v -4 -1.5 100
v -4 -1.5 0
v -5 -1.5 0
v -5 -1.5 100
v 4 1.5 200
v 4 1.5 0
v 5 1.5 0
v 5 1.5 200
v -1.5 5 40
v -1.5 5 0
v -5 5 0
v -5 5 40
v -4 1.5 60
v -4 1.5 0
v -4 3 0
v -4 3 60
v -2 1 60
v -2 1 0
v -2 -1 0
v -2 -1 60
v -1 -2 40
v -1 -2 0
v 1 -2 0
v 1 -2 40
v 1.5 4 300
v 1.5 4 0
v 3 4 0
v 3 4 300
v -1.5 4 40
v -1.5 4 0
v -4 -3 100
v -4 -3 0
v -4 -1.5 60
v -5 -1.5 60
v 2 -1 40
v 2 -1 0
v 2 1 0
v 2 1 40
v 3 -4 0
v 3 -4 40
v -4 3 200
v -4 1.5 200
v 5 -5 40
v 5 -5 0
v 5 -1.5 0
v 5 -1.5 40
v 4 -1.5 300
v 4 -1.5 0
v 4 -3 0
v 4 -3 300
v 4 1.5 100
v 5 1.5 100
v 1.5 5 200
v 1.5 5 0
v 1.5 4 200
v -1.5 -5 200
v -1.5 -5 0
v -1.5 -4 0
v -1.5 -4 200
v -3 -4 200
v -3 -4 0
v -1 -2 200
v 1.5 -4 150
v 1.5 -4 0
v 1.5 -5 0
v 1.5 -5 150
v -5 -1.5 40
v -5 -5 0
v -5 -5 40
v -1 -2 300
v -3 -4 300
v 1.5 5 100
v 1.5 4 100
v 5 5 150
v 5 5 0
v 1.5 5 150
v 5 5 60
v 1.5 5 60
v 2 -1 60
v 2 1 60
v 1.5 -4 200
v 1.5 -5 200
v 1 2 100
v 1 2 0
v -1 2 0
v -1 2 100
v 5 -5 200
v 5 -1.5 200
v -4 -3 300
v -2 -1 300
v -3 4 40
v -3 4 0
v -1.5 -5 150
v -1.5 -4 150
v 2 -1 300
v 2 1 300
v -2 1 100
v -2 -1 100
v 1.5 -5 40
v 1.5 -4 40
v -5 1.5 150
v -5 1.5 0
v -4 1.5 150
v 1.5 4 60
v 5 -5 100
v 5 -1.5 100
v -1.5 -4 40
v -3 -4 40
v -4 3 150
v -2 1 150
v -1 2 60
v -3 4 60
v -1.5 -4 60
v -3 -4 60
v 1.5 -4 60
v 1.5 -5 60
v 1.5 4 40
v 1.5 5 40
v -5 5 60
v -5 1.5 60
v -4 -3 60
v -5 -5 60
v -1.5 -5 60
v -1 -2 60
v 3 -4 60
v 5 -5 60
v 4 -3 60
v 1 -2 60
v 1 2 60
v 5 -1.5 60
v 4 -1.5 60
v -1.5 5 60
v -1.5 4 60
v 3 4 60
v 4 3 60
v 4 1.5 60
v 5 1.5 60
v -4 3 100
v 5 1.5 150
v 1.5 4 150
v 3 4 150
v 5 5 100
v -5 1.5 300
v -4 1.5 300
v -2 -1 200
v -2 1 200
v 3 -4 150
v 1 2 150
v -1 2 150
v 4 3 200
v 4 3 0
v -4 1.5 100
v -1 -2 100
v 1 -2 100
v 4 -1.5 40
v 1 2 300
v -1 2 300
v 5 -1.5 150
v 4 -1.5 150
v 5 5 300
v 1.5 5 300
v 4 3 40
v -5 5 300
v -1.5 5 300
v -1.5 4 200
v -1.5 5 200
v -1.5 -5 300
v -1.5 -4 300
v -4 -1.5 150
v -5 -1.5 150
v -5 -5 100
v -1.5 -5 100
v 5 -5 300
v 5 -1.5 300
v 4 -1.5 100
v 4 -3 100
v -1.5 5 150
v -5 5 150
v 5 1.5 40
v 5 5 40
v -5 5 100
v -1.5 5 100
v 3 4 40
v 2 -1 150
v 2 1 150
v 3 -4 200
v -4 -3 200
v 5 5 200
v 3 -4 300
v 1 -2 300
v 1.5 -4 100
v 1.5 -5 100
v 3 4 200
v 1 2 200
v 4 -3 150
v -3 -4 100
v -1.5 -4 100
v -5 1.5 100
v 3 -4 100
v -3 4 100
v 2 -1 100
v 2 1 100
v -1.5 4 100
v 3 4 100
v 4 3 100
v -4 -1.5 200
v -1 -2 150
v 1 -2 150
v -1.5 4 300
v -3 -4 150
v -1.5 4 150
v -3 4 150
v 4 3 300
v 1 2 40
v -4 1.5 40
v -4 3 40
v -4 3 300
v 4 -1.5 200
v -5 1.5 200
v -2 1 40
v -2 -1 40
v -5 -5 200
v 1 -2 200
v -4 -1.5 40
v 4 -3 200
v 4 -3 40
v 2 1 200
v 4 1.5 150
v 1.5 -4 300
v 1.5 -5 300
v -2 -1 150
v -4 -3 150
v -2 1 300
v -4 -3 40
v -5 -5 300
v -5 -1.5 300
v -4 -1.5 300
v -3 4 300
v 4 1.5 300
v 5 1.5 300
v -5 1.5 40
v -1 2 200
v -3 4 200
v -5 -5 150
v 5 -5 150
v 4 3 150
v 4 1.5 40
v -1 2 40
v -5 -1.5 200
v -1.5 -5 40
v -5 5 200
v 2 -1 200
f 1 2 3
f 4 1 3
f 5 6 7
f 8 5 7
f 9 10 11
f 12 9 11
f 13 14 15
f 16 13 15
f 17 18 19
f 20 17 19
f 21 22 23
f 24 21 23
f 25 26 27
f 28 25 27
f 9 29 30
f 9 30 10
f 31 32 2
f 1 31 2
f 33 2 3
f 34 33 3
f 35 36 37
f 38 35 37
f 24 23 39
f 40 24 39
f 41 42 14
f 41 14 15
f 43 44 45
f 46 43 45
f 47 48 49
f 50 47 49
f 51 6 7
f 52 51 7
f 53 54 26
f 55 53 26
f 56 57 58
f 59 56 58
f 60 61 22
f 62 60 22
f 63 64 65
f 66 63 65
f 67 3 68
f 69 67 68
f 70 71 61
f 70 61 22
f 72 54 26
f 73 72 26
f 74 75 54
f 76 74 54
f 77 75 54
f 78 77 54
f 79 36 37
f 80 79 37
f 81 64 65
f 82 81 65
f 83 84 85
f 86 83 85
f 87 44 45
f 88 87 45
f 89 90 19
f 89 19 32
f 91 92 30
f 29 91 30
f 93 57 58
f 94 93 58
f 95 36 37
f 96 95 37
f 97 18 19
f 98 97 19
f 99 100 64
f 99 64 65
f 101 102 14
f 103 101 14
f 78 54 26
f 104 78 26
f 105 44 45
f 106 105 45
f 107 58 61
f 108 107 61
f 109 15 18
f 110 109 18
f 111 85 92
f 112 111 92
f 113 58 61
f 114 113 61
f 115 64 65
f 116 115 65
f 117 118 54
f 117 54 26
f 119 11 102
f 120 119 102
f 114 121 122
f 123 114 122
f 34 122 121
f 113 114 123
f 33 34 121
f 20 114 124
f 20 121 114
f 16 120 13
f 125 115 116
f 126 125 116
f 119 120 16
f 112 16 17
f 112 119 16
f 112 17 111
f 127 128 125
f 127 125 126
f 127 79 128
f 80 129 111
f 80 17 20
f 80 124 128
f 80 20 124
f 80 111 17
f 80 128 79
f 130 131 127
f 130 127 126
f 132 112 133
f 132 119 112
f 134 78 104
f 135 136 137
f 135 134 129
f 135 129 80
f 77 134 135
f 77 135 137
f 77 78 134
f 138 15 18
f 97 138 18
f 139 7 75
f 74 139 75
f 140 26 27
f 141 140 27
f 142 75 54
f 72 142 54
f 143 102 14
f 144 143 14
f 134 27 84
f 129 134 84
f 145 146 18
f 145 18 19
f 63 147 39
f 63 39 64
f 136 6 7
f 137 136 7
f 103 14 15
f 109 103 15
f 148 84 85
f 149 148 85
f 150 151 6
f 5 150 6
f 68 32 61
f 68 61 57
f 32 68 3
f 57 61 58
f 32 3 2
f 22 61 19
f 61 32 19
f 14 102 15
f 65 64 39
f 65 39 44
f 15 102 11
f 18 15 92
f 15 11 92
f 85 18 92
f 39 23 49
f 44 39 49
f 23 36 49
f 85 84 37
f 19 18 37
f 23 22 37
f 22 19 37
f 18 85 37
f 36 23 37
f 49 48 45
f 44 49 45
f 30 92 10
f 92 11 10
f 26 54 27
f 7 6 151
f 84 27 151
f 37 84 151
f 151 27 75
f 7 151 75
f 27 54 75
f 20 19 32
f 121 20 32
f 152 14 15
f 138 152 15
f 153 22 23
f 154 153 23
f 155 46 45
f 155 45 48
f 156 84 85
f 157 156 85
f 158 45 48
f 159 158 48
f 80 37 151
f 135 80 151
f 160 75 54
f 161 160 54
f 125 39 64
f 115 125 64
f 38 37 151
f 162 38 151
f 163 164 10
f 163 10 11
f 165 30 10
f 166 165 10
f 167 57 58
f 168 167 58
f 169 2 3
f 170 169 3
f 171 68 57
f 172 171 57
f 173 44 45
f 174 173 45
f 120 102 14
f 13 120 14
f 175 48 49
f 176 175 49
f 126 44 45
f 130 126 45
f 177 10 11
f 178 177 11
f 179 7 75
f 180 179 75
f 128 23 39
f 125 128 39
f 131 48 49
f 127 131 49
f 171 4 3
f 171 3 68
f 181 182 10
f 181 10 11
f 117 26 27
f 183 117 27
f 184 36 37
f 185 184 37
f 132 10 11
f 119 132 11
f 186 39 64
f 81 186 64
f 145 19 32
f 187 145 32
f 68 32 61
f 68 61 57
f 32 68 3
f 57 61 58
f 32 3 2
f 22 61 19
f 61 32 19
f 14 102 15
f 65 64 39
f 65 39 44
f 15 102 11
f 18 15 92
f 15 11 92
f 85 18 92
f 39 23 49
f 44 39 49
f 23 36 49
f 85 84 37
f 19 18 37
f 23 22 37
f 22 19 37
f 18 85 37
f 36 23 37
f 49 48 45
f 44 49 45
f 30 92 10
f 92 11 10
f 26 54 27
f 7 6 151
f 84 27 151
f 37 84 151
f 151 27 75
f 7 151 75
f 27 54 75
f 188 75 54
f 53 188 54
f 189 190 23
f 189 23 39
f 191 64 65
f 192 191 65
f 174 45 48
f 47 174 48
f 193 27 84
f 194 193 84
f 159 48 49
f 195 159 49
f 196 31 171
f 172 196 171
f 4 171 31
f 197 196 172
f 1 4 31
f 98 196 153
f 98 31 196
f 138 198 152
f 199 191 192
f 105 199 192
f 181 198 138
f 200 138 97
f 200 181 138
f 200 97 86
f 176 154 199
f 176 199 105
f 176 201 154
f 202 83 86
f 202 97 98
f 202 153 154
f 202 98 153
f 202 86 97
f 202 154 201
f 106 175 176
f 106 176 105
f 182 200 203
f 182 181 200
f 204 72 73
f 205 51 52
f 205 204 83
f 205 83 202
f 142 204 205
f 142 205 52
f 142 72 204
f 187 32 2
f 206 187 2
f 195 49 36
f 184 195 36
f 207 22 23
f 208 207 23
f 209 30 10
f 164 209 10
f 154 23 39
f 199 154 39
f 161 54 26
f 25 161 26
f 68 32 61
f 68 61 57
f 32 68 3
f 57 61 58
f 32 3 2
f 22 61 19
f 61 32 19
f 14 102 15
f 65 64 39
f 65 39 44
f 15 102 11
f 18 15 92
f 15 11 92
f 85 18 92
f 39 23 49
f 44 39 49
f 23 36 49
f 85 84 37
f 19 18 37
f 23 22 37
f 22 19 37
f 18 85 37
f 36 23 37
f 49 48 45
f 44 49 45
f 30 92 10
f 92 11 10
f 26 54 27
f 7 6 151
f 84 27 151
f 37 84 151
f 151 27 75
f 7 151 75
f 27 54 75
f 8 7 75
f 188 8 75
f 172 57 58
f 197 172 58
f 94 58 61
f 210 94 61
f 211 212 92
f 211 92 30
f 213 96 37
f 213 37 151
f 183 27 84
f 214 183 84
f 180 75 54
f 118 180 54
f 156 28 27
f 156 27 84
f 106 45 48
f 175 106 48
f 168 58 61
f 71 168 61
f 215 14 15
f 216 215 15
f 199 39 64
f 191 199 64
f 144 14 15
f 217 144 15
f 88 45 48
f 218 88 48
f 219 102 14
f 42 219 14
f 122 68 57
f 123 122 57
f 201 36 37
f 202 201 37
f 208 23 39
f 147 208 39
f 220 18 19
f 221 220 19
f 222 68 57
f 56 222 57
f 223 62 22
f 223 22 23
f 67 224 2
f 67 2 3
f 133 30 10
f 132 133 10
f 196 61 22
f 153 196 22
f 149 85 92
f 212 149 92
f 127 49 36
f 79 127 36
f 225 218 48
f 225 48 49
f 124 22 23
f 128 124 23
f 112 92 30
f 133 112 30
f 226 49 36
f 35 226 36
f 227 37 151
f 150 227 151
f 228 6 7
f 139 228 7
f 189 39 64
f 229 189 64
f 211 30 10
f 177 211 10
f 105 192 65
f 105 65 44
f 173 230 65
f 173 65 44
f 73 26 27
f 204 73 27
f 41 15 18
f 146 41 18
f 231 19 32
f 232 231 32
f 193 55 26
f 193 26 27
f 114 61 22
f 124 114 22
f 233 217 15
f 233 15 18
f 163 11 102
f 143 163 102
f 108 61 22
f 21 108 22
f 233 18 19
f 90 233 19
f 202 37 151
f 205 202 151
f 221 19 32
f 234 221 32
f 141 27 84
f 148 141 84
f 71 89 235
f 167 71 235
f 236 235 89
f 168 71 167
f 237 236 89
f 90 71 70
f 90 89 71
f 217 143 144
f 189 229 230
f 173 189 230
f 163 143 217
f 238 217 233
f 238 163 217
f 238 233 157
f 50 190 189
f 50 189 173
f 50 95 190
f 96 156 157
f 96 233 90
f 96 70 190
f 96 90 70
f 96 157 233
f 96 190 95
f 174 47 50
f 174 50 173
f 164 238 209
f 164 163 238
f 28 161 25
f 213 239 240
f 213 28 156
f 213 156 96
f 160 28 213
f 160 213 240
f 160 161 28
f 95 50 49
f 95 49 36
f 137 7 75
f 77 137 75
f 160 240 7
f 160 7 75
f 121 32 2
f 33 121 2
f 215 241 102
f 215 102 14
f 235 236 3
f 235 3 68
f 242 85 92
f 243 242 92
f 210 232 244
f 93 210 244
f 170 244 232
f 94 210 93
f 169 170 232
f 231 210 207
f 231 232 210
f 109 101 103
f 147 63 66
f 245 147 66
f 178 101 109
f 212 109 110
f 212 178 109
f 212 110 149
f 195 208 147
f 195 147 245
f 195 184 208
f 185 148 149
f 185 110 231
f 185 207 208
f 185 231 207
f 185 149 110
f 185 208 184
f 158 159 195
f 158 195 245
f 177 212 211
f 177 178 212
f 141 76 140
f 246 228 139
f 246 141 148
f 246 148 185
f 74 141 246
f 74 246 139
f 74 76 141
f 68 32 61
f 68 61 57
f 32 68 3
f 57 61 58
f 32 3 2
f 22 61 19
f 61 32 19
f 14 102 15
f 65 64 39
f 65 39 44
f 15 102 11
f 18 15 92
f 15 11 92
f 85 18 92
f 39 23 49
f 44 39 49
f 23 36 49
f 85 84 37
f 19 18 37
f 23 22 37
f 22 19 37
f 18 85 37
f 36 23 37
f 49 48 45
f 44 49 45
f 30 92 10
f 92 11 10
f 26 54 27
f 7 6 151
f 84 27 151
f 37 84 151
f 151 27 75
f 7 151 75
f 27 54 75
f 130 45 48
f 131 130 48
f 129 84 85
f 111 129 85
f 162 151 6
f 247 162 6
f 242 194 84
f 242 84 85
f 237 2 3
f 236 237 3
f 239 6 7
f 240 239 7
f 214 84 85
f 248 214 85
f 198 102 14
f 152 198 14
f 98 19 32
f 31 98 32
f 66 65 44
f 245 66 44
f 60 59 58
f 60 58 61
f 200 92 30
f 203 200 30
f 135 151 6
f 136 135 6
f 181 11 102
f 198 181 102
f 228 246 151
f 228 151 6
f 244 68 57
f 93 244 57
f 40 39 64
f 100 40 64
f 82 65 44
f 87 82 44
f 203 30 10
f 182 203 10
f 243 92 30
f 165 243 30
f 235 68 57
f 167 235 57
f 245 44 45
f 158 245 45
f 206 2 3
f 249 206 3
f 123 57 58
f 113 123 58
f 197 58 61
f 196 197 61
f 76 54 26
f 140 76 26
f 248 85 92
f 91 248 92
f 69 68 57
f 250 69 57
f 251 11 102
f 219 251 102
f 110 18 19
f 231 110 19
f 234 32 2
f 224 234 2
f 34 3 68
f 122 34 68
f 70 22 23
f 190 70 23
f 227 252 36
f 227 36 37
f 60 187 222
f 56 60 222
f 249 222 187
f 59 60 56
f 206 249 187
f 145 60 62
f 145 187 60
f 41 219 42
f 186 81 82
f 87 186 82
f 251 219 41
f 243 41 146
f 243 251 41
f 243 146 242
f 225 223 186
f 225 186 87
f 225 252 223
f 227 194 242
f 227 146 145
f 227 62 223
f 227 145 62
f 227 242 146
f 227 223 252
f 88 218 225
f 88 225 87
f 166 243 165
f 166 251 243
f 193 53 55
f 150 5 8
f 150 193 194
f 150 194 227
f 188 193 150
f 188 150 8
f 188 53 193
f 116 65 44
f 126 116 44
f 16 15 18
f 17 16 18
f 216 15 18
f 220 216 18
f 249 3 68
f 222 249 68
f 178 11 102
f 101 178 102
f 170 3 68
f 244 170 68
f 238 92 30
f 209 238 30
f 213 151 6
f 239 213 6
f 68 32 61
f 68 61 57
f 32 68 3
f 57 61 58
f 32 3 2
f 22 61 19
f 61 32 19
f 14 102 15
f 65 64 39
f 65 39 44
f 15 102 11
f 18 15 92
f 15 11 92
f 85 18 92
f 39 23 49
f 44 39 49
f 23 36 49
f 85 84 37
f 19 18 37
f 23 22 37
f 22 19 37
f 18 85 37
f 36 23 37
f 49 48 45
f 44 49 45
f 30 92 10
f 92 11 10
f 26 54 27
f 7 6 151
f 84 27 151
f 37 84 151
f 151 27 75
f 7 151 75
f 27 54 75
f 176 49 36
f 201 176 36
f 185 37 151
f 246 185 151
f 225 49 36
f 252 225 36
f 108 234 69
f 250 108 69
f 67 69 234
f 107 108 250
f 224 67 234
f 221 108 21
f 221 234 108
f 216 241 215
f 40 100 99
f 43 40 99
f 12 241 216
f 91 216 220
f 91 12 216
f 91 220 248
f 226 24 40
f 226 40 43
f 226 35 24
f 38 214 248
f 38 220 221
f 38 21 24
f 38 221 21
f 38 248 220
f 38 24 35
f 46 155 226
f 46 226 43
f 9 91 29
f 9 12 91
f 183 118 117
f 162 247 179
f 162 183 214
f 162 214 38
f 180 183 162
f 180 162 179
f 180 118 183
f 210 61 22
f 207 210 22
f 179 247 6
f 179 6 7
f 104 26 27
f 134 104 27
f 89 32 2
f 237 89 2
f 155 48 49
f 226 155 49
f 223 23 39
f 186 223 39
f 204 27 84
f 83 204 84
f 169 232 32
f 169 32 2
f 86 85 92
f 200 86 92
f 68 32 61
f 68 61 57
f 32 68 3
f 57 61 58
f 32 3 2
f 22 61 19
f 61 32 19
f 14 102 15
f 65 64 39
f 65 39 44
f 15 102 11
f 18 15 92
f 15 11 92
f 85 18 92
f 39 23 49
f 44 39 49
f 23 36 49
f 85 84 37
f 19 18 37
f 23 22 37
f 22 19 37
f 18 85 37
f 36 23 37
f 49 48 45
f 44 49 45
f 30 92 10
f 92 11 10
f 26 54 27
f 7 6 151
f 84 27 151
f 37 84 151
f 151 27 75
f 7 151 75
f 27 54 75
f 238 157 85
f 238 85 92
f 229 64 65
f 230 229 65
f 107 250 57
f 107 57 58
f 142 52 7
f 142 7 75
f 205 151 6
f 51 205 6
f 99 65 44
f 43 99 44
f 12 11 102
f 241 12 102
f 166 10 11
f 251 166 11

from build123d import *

# Parameters (mm, degrees)
F1_DEPTH = 200
F2_DEPTH = 150
F3_DEPTH = 100
F4_DEPTH = 300
F5_DEPTH = 60
F6_DEPTH = 40


with BuildPart() as f1:
    # F0 (on Top) → F1 (new body)
    with BuildSketch(Plane.XY):
        Polygon((3, -4), (1.5, -4), (1.5, -5), (5, -5), (5, -1.5), (4, -1.5), (4, -3), (2, -1), (2, 0), (2, 1), (4, 3), (4, 1.5), (5, 1.5), (5, 5), (1.5, 5), (1.5, 4), (3, 4), (1, 2), (0, 2), (-1, 2), (-3, 4), (-1.5, 4), (-1.5, 5), (-5, 5), (-5, 1.5), (-4, 1.5), (-4, 3), (-2, 1), (-2, 0), (-2, -1), (-4, -3), (-4, -1.5), (-5, -1.5), (-5, -5), (-1.5, -5), (-1.5, -4), (-3, -4), (-1, -2), (0, -2), (1, -2), align=None)
    extrude(amount=F1_DEPTH)


with BuildPart() as f2:
    # F0 (on Top) → F2 (new body)
    with BuildSketch(Plane.XY):
        Polygon((3, -4), (1.5, -4), (1.5, -5), (5, -5), (5, -1.5), (4, -1.5), (4, -3), (2, -1), (2, 0), (2, 1), (4, 3), (4, 1.5), (5, 1.5), (5, 5), (1.5, 5), (1.5, 4), (3, 4), (1, 2), (0, 2), (-1, 2), (-3, 4), (-1.5, 4), (-1.5, 5), (-5, 5), (-5, 1.5), (-4, 1.5), (-4, 3), (-2, 1), (-2, 0), (-2, -1), (-4, -3), (-4, -1.5), (-5, -1.5), (-5, -5), (-1.5, -5), (-1.5, -4), (-3, -4), (-1, -2), (0, -2), (1, -2), align=None)
    extrude(amount=F2_DEPTH)


with BuildPart() as f3:
    # F0 (on Top) → F3 (new body)
    with BuildSketch(Plane.XY):
        Polygon((3, -4), (1.5, -4), (1.5, -5), (5, -5), (5, -1.5), (4, -1.5), (4, -3), (2, -1), (2, 0), (2, 1), (4, 3), (4, 1.5), (5, 1.5), (5, 5), (1.5, 5), (1.5, 4), (3, 4), (1, 2), (0, 2), (-1, 2), (-3, 4), (-1.5, 4), (-1.5, 5), (-5, 5), (-5, 1.5), (-4, 1.5), (-4, 3), (-2, 1), (-2, 0), (-2, -1), (-4, -3), (-4, -1.5), (-5, -1.5), (-5, -5), (-1.5, -5), (-1.5, -4), (-3, -4), (-1, -2), (0, -2), (1, -2), align=None)
    extrude(amount=F3_DEPTH)


with BuildPart() as f4:
    # F0 (on Top) → F4 (new body)
    with BuildSketch(Plane.XY):
        Polygon((3, -4), (1.5, -4), (1.5, -5), (5, -5), (5, -1.5), (4, -1.5), (4, -3), (2, -1), (2, 0), (2, 1), (4, 3), (4, 1.5), (5, 1.5), (5, 5), (1.5, 5), (1.5, 4), (3, 4), (1, 2), (0, 2), (-1, 2), (-3, 4), (-1.5, 4), (-1.5, 5), (-5, 5), (-5, 1.5), (-4, 1.5), (-4, 3), (-2, 1), (-2, 0), (-2, -1), (-4, -3), (-4, -1.5), (-5, -1.5), (-5, -5), (-1.5, -5), (-1.5, -4), (-3, -4), (-1, -2), (0, -2), (1, -2), align=None)
    extrude(amount=F4_DEPTH)


with BuildPart() as f5:
    # F0 (on Top) → F5 (new body)
    with BuildSketch(Plane.XY):
        Polygon((3, -4), (1.5, -4), (1.5, -5), (5, -5), (5, -1.5), (4, -1.5), (4, -3), (2, -1), (2, 0), (2, 1), (4, 3), (4, 1.5), (5, 1.5), (5, 5), (1.5, 5), (1.5, 4), (3, 4), (1, 2), (0, 2), (-1, 2), (-3, 4), (-1.5, 4), (-1.5, 5), (-5, 5), (-5, 1.5), (-4, 1.5), (-4, 3), (-2, 1), (-2, 0), (-2, -1), (-4, -3), (-4, -1.5), (-5, -1.5), (-5, -5), (-1.5, -5), (-1.5, -4), (-3, -4), (-1, -2), (0, -2), (1, -2), align=None)
    extrude(amount=F5_DEPTH)


with BuildPart() as f6:
    # F0 (on Top) → F6 (new body)
    with BuildSketch(Plane.XY):
        Polygon((3, -4), (1.5, -4), (1.5, -5), (5, -5), (5, -1.5), (4, -1.5), (4, -3), (2, -1), (2, 0), (2, 1), (4, 3), (4, 1.5), (5, 1.5), (5, 5), (1.5, 5), (1.5, 4), (3, 4), (1, 2), (0, 2), (-1, 2), (-3, 4), (-1.5, 4), (-1.5, 5), (-5, 5), (-5, 1.5), (-4, 1.5), (-4, 3), (-2, 1), (-2, 0), (-2, -1), (-4, -3), (-4, -1.5), (-5, -1.5), (-5, -5), (-1.5, -5), (-1.5, -4), (-3, -4), (-1, -2), (0, -2), (1, -2), align=None)
    extrude(amount=F6_DEPTH)


solid = Compound([f1.part, f2.part, f3.part, f4.part, f5.part, f6.part])
